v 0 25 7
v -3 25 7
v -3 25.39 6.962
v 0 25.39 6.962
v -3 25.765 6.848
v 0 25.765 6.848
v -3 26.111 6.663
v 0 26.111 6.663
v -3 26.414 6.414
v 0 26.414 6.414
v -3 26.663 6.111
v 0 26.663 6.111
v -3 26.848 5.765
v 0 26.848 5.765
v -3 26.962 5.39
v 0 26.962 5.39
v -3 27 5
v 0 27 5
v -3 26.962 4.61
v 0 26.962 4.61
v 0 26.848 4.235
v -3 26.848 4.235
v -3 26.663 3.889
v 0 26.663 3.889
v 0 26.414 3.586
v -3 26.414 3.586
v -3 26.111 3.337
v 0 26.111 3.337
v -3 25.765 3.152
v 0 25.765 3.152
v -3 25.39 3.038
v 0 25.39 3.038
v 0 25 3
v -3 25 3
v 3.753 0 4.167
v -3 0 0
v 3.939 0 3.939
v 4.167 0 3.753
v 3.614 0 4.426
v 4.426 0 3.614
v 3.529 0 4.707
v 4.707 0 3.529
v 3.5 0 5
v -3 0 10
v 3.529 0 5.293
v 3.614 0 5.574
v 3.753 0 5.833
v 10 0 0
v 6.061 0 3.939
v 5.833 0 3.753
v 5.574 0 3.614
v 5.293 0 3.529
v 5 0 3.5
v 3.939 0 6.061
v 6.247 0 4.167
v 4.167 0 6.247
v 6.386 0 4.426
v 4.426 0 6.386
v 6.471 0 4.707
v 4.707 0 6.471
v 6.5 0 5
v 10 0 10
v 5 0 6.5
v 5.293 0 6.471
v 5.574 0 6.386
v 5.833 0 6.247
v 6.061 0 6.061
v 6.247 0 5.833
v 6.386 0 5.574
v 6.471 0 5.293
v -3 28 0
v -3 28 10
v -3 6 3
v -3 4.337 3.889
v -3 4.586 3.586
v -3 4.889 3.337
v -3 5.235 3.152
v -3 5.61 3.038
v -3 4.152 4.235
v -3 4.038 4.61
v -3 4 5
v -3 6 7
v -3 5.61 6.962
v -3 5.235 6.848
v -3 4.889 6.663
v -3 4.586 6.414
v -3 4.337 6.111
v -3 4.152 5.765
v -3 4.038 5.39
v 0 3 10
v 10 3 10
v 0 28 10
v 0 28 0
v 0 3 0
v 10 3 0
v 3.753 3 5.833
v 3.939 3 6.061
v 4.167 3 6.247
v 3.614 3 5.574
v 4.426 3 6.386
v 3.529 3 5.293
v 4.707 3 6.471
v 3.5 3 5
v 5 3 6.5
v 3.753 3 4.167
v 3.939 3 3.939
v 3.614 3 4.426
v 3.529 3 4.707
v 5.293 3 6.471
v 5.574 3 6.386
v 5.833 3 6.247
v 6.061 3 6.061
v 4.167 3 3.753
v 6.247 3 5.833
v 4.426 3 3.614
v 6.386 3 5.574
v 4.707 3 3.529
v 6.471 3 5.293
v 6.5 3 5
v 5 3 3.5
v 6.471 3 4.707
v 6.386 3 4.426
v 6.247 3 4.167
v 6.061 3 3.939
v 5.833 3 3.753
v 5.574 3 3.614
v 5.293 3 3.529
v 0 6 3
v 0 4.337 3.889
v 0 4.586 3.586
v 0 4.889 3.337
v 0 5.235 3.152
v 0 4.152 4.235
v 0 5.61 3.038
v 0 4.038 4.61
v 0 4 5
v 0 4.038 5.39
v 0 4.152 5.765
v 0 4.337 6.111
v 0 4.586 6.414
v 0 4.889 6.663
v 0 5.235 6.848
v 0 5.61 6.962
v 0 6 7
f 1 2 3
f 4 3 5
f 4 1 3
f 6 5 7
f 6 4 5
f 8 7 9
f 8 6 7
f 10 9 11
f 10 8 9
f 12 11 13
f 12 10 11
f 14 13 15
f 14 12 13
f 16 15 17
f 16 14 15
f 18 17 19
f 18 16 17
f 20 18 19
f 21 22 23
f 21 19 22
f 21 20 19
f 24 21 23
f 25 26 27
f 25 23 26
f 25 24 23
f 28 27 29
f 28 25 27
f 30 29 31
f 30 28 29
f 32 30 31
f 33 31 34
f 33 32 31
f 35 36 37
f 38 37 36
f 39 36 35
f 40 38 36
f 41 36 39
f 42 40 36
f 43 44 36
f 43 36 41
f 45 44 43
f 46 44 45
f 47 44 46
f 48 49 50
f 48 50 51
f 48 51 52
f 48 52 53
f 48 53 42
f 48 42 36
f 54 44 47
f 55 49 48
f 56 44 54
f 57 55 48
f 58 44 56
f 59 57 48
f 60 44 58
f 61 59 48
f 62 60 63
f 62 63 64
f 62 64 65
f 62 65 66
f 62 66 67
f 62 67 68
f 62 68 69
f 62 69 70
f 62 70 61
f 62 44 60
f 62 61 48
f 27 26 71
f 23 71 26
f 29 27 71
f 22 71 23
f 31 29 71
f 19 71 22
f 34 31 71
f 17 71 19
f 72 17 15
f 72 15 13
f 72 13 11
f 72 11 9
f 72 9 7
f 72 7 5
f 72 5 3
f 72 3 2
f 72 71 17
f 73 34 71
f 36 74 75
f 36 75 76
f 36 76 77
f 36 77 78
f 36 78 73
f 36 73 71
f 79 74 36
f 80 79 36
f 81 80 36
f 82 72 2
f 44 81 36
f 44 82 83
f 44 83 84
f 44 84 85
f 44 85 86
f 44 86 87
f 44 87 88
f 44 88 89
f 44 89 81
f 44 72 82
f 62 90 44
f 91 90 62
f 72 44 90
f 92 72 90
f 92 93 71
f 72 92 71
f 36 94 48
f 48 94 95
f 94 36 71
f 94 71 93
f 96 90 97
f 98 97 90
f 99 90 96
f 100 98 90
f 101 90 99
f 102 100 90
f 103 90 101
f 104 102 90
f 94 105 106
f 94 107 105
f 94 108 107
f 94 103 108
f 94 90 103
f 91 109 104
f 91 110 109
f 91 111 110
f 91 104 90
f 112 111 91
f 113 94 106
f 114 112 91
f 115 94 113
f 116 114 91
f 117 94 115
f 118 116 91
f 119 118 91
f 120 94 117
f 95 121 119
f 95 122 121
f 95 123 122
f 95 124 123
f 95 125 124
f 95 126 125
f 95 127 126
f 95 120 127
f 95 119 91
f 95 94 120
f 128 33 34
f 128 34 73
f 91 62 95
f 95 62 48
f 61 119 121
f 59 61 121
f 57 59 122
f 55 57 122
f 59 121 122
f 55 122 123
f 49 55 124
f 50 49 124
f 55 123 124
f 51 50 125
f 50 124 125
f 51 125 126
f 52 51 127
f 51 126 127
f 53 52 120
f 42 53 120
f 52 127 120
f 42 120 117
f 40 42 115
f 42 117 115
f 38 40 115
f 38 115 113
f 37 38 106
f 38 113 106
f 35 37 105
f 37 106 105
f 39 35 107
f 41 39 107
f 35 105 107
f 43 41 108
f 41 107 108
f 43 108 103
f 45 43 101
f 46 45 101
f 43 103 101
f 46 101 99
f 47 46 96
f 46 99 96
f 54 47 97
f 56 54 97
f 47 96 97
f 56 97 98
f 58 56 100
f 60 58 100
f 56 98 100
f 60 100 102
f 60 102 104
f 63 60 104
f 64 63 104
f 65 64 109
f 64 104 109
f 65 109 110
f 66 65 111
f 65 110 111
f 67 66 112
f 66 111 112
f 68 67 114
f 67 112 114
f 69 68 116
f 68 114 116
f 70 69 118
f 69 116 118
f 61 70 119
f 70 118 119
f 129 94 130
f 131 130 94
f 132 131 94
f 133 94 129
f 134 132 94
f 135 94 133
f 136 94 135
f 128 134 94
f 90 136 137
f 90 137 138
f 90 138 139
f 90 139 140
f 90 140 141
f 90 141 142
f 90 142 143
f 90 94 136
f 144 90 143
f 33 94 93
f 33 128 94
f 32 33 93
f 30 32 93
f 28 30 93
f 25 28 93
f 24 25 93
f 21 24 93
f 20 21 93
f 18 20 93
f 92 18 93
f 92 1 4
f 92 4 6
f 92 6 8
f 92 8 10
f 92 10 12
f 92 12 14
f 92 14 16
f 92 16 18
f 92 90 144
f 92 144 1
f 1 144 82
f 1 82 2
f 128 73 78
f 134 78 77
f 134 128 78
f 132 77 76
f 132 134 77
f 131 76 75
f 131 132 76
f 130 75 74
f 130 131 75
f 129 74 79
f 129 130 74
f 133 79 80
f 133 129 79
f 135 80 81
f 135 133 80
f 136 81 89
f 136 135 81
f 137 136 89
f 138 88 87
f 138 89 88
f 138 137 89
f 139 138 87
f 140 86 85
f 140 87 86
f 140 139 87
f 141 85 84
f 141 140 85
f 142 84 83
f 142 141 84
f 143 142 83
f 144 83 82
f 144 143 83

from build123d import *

# Parameters (mm, degrees)
SKETCH_2_W          = 10
SKETCH_2_H          = 10
EXTRUDE_2_DEPTH     = 3
SKETCH_3_R          = 1.5
CUT_EXTRUDE_1_DEPTH = 3
EXTRUDE_3_DEPTH     = 10
CUT_EXTRUDE_2_DEPTH = 10


with BuildPart() as part:
    # 草图2 → 凸台-拉伸2 (new body)
    with BuildSketch(Plane(origin=(0, 0, 0), x_dir=(1, 0, 0), z_dir=(0, 1, 0))):
        with Locations((5, -5)):
            Rectangle(SKETCH_2_W, SKETCH_2_H)
    extrude(amount=EXTRUDE_2_DEPTH)

    # 草图3 → 切除-拉伸1 (cut)
    with BuildSketch(Plane(origin=(0, 3, 0), x_dir=(1, 0, 0), z_dir=(0, 1, 0))):
        with Locations((5, -5)):
            Circle(SKETCH_3_R)
    extrude(amount=-CUT_EXTRUDE_1_DEPTH, mode=Mode.SUBTRACT)

    # 草图5 → 凸台-拉伸3 (add, through all)
    with BuildSketch(Plane.XY.offset(10)):
        Polygon((0, 3), (0, 28), (-3, 28), (-3, 0), (0, 0), align=None)
    extrude(amount=-EXTRUDE_3_DEPTH)

    # 草图6 → 切除-拉伸2 (cut)
    with BuildSketch(Plane(origin=(0, 0, 0), x_dir=(0, 0, -1), z_dir=(1, 0, 0))):
        with BuildLine():
            Line((-3, 25), (-3, 6))
            ThreePointArc((-3, 6), (-5, 4), (-7, 6))
            Line((-7, 6), (-7, 25))
            ThreePointArc((-7, 25), (-5, 27), (-3, 25))
        make_face()
    extrude(amount=-CUT_EXTRUDE_2_DEPTH, mode=Mode.SUBTRACT)


solid = part.part
